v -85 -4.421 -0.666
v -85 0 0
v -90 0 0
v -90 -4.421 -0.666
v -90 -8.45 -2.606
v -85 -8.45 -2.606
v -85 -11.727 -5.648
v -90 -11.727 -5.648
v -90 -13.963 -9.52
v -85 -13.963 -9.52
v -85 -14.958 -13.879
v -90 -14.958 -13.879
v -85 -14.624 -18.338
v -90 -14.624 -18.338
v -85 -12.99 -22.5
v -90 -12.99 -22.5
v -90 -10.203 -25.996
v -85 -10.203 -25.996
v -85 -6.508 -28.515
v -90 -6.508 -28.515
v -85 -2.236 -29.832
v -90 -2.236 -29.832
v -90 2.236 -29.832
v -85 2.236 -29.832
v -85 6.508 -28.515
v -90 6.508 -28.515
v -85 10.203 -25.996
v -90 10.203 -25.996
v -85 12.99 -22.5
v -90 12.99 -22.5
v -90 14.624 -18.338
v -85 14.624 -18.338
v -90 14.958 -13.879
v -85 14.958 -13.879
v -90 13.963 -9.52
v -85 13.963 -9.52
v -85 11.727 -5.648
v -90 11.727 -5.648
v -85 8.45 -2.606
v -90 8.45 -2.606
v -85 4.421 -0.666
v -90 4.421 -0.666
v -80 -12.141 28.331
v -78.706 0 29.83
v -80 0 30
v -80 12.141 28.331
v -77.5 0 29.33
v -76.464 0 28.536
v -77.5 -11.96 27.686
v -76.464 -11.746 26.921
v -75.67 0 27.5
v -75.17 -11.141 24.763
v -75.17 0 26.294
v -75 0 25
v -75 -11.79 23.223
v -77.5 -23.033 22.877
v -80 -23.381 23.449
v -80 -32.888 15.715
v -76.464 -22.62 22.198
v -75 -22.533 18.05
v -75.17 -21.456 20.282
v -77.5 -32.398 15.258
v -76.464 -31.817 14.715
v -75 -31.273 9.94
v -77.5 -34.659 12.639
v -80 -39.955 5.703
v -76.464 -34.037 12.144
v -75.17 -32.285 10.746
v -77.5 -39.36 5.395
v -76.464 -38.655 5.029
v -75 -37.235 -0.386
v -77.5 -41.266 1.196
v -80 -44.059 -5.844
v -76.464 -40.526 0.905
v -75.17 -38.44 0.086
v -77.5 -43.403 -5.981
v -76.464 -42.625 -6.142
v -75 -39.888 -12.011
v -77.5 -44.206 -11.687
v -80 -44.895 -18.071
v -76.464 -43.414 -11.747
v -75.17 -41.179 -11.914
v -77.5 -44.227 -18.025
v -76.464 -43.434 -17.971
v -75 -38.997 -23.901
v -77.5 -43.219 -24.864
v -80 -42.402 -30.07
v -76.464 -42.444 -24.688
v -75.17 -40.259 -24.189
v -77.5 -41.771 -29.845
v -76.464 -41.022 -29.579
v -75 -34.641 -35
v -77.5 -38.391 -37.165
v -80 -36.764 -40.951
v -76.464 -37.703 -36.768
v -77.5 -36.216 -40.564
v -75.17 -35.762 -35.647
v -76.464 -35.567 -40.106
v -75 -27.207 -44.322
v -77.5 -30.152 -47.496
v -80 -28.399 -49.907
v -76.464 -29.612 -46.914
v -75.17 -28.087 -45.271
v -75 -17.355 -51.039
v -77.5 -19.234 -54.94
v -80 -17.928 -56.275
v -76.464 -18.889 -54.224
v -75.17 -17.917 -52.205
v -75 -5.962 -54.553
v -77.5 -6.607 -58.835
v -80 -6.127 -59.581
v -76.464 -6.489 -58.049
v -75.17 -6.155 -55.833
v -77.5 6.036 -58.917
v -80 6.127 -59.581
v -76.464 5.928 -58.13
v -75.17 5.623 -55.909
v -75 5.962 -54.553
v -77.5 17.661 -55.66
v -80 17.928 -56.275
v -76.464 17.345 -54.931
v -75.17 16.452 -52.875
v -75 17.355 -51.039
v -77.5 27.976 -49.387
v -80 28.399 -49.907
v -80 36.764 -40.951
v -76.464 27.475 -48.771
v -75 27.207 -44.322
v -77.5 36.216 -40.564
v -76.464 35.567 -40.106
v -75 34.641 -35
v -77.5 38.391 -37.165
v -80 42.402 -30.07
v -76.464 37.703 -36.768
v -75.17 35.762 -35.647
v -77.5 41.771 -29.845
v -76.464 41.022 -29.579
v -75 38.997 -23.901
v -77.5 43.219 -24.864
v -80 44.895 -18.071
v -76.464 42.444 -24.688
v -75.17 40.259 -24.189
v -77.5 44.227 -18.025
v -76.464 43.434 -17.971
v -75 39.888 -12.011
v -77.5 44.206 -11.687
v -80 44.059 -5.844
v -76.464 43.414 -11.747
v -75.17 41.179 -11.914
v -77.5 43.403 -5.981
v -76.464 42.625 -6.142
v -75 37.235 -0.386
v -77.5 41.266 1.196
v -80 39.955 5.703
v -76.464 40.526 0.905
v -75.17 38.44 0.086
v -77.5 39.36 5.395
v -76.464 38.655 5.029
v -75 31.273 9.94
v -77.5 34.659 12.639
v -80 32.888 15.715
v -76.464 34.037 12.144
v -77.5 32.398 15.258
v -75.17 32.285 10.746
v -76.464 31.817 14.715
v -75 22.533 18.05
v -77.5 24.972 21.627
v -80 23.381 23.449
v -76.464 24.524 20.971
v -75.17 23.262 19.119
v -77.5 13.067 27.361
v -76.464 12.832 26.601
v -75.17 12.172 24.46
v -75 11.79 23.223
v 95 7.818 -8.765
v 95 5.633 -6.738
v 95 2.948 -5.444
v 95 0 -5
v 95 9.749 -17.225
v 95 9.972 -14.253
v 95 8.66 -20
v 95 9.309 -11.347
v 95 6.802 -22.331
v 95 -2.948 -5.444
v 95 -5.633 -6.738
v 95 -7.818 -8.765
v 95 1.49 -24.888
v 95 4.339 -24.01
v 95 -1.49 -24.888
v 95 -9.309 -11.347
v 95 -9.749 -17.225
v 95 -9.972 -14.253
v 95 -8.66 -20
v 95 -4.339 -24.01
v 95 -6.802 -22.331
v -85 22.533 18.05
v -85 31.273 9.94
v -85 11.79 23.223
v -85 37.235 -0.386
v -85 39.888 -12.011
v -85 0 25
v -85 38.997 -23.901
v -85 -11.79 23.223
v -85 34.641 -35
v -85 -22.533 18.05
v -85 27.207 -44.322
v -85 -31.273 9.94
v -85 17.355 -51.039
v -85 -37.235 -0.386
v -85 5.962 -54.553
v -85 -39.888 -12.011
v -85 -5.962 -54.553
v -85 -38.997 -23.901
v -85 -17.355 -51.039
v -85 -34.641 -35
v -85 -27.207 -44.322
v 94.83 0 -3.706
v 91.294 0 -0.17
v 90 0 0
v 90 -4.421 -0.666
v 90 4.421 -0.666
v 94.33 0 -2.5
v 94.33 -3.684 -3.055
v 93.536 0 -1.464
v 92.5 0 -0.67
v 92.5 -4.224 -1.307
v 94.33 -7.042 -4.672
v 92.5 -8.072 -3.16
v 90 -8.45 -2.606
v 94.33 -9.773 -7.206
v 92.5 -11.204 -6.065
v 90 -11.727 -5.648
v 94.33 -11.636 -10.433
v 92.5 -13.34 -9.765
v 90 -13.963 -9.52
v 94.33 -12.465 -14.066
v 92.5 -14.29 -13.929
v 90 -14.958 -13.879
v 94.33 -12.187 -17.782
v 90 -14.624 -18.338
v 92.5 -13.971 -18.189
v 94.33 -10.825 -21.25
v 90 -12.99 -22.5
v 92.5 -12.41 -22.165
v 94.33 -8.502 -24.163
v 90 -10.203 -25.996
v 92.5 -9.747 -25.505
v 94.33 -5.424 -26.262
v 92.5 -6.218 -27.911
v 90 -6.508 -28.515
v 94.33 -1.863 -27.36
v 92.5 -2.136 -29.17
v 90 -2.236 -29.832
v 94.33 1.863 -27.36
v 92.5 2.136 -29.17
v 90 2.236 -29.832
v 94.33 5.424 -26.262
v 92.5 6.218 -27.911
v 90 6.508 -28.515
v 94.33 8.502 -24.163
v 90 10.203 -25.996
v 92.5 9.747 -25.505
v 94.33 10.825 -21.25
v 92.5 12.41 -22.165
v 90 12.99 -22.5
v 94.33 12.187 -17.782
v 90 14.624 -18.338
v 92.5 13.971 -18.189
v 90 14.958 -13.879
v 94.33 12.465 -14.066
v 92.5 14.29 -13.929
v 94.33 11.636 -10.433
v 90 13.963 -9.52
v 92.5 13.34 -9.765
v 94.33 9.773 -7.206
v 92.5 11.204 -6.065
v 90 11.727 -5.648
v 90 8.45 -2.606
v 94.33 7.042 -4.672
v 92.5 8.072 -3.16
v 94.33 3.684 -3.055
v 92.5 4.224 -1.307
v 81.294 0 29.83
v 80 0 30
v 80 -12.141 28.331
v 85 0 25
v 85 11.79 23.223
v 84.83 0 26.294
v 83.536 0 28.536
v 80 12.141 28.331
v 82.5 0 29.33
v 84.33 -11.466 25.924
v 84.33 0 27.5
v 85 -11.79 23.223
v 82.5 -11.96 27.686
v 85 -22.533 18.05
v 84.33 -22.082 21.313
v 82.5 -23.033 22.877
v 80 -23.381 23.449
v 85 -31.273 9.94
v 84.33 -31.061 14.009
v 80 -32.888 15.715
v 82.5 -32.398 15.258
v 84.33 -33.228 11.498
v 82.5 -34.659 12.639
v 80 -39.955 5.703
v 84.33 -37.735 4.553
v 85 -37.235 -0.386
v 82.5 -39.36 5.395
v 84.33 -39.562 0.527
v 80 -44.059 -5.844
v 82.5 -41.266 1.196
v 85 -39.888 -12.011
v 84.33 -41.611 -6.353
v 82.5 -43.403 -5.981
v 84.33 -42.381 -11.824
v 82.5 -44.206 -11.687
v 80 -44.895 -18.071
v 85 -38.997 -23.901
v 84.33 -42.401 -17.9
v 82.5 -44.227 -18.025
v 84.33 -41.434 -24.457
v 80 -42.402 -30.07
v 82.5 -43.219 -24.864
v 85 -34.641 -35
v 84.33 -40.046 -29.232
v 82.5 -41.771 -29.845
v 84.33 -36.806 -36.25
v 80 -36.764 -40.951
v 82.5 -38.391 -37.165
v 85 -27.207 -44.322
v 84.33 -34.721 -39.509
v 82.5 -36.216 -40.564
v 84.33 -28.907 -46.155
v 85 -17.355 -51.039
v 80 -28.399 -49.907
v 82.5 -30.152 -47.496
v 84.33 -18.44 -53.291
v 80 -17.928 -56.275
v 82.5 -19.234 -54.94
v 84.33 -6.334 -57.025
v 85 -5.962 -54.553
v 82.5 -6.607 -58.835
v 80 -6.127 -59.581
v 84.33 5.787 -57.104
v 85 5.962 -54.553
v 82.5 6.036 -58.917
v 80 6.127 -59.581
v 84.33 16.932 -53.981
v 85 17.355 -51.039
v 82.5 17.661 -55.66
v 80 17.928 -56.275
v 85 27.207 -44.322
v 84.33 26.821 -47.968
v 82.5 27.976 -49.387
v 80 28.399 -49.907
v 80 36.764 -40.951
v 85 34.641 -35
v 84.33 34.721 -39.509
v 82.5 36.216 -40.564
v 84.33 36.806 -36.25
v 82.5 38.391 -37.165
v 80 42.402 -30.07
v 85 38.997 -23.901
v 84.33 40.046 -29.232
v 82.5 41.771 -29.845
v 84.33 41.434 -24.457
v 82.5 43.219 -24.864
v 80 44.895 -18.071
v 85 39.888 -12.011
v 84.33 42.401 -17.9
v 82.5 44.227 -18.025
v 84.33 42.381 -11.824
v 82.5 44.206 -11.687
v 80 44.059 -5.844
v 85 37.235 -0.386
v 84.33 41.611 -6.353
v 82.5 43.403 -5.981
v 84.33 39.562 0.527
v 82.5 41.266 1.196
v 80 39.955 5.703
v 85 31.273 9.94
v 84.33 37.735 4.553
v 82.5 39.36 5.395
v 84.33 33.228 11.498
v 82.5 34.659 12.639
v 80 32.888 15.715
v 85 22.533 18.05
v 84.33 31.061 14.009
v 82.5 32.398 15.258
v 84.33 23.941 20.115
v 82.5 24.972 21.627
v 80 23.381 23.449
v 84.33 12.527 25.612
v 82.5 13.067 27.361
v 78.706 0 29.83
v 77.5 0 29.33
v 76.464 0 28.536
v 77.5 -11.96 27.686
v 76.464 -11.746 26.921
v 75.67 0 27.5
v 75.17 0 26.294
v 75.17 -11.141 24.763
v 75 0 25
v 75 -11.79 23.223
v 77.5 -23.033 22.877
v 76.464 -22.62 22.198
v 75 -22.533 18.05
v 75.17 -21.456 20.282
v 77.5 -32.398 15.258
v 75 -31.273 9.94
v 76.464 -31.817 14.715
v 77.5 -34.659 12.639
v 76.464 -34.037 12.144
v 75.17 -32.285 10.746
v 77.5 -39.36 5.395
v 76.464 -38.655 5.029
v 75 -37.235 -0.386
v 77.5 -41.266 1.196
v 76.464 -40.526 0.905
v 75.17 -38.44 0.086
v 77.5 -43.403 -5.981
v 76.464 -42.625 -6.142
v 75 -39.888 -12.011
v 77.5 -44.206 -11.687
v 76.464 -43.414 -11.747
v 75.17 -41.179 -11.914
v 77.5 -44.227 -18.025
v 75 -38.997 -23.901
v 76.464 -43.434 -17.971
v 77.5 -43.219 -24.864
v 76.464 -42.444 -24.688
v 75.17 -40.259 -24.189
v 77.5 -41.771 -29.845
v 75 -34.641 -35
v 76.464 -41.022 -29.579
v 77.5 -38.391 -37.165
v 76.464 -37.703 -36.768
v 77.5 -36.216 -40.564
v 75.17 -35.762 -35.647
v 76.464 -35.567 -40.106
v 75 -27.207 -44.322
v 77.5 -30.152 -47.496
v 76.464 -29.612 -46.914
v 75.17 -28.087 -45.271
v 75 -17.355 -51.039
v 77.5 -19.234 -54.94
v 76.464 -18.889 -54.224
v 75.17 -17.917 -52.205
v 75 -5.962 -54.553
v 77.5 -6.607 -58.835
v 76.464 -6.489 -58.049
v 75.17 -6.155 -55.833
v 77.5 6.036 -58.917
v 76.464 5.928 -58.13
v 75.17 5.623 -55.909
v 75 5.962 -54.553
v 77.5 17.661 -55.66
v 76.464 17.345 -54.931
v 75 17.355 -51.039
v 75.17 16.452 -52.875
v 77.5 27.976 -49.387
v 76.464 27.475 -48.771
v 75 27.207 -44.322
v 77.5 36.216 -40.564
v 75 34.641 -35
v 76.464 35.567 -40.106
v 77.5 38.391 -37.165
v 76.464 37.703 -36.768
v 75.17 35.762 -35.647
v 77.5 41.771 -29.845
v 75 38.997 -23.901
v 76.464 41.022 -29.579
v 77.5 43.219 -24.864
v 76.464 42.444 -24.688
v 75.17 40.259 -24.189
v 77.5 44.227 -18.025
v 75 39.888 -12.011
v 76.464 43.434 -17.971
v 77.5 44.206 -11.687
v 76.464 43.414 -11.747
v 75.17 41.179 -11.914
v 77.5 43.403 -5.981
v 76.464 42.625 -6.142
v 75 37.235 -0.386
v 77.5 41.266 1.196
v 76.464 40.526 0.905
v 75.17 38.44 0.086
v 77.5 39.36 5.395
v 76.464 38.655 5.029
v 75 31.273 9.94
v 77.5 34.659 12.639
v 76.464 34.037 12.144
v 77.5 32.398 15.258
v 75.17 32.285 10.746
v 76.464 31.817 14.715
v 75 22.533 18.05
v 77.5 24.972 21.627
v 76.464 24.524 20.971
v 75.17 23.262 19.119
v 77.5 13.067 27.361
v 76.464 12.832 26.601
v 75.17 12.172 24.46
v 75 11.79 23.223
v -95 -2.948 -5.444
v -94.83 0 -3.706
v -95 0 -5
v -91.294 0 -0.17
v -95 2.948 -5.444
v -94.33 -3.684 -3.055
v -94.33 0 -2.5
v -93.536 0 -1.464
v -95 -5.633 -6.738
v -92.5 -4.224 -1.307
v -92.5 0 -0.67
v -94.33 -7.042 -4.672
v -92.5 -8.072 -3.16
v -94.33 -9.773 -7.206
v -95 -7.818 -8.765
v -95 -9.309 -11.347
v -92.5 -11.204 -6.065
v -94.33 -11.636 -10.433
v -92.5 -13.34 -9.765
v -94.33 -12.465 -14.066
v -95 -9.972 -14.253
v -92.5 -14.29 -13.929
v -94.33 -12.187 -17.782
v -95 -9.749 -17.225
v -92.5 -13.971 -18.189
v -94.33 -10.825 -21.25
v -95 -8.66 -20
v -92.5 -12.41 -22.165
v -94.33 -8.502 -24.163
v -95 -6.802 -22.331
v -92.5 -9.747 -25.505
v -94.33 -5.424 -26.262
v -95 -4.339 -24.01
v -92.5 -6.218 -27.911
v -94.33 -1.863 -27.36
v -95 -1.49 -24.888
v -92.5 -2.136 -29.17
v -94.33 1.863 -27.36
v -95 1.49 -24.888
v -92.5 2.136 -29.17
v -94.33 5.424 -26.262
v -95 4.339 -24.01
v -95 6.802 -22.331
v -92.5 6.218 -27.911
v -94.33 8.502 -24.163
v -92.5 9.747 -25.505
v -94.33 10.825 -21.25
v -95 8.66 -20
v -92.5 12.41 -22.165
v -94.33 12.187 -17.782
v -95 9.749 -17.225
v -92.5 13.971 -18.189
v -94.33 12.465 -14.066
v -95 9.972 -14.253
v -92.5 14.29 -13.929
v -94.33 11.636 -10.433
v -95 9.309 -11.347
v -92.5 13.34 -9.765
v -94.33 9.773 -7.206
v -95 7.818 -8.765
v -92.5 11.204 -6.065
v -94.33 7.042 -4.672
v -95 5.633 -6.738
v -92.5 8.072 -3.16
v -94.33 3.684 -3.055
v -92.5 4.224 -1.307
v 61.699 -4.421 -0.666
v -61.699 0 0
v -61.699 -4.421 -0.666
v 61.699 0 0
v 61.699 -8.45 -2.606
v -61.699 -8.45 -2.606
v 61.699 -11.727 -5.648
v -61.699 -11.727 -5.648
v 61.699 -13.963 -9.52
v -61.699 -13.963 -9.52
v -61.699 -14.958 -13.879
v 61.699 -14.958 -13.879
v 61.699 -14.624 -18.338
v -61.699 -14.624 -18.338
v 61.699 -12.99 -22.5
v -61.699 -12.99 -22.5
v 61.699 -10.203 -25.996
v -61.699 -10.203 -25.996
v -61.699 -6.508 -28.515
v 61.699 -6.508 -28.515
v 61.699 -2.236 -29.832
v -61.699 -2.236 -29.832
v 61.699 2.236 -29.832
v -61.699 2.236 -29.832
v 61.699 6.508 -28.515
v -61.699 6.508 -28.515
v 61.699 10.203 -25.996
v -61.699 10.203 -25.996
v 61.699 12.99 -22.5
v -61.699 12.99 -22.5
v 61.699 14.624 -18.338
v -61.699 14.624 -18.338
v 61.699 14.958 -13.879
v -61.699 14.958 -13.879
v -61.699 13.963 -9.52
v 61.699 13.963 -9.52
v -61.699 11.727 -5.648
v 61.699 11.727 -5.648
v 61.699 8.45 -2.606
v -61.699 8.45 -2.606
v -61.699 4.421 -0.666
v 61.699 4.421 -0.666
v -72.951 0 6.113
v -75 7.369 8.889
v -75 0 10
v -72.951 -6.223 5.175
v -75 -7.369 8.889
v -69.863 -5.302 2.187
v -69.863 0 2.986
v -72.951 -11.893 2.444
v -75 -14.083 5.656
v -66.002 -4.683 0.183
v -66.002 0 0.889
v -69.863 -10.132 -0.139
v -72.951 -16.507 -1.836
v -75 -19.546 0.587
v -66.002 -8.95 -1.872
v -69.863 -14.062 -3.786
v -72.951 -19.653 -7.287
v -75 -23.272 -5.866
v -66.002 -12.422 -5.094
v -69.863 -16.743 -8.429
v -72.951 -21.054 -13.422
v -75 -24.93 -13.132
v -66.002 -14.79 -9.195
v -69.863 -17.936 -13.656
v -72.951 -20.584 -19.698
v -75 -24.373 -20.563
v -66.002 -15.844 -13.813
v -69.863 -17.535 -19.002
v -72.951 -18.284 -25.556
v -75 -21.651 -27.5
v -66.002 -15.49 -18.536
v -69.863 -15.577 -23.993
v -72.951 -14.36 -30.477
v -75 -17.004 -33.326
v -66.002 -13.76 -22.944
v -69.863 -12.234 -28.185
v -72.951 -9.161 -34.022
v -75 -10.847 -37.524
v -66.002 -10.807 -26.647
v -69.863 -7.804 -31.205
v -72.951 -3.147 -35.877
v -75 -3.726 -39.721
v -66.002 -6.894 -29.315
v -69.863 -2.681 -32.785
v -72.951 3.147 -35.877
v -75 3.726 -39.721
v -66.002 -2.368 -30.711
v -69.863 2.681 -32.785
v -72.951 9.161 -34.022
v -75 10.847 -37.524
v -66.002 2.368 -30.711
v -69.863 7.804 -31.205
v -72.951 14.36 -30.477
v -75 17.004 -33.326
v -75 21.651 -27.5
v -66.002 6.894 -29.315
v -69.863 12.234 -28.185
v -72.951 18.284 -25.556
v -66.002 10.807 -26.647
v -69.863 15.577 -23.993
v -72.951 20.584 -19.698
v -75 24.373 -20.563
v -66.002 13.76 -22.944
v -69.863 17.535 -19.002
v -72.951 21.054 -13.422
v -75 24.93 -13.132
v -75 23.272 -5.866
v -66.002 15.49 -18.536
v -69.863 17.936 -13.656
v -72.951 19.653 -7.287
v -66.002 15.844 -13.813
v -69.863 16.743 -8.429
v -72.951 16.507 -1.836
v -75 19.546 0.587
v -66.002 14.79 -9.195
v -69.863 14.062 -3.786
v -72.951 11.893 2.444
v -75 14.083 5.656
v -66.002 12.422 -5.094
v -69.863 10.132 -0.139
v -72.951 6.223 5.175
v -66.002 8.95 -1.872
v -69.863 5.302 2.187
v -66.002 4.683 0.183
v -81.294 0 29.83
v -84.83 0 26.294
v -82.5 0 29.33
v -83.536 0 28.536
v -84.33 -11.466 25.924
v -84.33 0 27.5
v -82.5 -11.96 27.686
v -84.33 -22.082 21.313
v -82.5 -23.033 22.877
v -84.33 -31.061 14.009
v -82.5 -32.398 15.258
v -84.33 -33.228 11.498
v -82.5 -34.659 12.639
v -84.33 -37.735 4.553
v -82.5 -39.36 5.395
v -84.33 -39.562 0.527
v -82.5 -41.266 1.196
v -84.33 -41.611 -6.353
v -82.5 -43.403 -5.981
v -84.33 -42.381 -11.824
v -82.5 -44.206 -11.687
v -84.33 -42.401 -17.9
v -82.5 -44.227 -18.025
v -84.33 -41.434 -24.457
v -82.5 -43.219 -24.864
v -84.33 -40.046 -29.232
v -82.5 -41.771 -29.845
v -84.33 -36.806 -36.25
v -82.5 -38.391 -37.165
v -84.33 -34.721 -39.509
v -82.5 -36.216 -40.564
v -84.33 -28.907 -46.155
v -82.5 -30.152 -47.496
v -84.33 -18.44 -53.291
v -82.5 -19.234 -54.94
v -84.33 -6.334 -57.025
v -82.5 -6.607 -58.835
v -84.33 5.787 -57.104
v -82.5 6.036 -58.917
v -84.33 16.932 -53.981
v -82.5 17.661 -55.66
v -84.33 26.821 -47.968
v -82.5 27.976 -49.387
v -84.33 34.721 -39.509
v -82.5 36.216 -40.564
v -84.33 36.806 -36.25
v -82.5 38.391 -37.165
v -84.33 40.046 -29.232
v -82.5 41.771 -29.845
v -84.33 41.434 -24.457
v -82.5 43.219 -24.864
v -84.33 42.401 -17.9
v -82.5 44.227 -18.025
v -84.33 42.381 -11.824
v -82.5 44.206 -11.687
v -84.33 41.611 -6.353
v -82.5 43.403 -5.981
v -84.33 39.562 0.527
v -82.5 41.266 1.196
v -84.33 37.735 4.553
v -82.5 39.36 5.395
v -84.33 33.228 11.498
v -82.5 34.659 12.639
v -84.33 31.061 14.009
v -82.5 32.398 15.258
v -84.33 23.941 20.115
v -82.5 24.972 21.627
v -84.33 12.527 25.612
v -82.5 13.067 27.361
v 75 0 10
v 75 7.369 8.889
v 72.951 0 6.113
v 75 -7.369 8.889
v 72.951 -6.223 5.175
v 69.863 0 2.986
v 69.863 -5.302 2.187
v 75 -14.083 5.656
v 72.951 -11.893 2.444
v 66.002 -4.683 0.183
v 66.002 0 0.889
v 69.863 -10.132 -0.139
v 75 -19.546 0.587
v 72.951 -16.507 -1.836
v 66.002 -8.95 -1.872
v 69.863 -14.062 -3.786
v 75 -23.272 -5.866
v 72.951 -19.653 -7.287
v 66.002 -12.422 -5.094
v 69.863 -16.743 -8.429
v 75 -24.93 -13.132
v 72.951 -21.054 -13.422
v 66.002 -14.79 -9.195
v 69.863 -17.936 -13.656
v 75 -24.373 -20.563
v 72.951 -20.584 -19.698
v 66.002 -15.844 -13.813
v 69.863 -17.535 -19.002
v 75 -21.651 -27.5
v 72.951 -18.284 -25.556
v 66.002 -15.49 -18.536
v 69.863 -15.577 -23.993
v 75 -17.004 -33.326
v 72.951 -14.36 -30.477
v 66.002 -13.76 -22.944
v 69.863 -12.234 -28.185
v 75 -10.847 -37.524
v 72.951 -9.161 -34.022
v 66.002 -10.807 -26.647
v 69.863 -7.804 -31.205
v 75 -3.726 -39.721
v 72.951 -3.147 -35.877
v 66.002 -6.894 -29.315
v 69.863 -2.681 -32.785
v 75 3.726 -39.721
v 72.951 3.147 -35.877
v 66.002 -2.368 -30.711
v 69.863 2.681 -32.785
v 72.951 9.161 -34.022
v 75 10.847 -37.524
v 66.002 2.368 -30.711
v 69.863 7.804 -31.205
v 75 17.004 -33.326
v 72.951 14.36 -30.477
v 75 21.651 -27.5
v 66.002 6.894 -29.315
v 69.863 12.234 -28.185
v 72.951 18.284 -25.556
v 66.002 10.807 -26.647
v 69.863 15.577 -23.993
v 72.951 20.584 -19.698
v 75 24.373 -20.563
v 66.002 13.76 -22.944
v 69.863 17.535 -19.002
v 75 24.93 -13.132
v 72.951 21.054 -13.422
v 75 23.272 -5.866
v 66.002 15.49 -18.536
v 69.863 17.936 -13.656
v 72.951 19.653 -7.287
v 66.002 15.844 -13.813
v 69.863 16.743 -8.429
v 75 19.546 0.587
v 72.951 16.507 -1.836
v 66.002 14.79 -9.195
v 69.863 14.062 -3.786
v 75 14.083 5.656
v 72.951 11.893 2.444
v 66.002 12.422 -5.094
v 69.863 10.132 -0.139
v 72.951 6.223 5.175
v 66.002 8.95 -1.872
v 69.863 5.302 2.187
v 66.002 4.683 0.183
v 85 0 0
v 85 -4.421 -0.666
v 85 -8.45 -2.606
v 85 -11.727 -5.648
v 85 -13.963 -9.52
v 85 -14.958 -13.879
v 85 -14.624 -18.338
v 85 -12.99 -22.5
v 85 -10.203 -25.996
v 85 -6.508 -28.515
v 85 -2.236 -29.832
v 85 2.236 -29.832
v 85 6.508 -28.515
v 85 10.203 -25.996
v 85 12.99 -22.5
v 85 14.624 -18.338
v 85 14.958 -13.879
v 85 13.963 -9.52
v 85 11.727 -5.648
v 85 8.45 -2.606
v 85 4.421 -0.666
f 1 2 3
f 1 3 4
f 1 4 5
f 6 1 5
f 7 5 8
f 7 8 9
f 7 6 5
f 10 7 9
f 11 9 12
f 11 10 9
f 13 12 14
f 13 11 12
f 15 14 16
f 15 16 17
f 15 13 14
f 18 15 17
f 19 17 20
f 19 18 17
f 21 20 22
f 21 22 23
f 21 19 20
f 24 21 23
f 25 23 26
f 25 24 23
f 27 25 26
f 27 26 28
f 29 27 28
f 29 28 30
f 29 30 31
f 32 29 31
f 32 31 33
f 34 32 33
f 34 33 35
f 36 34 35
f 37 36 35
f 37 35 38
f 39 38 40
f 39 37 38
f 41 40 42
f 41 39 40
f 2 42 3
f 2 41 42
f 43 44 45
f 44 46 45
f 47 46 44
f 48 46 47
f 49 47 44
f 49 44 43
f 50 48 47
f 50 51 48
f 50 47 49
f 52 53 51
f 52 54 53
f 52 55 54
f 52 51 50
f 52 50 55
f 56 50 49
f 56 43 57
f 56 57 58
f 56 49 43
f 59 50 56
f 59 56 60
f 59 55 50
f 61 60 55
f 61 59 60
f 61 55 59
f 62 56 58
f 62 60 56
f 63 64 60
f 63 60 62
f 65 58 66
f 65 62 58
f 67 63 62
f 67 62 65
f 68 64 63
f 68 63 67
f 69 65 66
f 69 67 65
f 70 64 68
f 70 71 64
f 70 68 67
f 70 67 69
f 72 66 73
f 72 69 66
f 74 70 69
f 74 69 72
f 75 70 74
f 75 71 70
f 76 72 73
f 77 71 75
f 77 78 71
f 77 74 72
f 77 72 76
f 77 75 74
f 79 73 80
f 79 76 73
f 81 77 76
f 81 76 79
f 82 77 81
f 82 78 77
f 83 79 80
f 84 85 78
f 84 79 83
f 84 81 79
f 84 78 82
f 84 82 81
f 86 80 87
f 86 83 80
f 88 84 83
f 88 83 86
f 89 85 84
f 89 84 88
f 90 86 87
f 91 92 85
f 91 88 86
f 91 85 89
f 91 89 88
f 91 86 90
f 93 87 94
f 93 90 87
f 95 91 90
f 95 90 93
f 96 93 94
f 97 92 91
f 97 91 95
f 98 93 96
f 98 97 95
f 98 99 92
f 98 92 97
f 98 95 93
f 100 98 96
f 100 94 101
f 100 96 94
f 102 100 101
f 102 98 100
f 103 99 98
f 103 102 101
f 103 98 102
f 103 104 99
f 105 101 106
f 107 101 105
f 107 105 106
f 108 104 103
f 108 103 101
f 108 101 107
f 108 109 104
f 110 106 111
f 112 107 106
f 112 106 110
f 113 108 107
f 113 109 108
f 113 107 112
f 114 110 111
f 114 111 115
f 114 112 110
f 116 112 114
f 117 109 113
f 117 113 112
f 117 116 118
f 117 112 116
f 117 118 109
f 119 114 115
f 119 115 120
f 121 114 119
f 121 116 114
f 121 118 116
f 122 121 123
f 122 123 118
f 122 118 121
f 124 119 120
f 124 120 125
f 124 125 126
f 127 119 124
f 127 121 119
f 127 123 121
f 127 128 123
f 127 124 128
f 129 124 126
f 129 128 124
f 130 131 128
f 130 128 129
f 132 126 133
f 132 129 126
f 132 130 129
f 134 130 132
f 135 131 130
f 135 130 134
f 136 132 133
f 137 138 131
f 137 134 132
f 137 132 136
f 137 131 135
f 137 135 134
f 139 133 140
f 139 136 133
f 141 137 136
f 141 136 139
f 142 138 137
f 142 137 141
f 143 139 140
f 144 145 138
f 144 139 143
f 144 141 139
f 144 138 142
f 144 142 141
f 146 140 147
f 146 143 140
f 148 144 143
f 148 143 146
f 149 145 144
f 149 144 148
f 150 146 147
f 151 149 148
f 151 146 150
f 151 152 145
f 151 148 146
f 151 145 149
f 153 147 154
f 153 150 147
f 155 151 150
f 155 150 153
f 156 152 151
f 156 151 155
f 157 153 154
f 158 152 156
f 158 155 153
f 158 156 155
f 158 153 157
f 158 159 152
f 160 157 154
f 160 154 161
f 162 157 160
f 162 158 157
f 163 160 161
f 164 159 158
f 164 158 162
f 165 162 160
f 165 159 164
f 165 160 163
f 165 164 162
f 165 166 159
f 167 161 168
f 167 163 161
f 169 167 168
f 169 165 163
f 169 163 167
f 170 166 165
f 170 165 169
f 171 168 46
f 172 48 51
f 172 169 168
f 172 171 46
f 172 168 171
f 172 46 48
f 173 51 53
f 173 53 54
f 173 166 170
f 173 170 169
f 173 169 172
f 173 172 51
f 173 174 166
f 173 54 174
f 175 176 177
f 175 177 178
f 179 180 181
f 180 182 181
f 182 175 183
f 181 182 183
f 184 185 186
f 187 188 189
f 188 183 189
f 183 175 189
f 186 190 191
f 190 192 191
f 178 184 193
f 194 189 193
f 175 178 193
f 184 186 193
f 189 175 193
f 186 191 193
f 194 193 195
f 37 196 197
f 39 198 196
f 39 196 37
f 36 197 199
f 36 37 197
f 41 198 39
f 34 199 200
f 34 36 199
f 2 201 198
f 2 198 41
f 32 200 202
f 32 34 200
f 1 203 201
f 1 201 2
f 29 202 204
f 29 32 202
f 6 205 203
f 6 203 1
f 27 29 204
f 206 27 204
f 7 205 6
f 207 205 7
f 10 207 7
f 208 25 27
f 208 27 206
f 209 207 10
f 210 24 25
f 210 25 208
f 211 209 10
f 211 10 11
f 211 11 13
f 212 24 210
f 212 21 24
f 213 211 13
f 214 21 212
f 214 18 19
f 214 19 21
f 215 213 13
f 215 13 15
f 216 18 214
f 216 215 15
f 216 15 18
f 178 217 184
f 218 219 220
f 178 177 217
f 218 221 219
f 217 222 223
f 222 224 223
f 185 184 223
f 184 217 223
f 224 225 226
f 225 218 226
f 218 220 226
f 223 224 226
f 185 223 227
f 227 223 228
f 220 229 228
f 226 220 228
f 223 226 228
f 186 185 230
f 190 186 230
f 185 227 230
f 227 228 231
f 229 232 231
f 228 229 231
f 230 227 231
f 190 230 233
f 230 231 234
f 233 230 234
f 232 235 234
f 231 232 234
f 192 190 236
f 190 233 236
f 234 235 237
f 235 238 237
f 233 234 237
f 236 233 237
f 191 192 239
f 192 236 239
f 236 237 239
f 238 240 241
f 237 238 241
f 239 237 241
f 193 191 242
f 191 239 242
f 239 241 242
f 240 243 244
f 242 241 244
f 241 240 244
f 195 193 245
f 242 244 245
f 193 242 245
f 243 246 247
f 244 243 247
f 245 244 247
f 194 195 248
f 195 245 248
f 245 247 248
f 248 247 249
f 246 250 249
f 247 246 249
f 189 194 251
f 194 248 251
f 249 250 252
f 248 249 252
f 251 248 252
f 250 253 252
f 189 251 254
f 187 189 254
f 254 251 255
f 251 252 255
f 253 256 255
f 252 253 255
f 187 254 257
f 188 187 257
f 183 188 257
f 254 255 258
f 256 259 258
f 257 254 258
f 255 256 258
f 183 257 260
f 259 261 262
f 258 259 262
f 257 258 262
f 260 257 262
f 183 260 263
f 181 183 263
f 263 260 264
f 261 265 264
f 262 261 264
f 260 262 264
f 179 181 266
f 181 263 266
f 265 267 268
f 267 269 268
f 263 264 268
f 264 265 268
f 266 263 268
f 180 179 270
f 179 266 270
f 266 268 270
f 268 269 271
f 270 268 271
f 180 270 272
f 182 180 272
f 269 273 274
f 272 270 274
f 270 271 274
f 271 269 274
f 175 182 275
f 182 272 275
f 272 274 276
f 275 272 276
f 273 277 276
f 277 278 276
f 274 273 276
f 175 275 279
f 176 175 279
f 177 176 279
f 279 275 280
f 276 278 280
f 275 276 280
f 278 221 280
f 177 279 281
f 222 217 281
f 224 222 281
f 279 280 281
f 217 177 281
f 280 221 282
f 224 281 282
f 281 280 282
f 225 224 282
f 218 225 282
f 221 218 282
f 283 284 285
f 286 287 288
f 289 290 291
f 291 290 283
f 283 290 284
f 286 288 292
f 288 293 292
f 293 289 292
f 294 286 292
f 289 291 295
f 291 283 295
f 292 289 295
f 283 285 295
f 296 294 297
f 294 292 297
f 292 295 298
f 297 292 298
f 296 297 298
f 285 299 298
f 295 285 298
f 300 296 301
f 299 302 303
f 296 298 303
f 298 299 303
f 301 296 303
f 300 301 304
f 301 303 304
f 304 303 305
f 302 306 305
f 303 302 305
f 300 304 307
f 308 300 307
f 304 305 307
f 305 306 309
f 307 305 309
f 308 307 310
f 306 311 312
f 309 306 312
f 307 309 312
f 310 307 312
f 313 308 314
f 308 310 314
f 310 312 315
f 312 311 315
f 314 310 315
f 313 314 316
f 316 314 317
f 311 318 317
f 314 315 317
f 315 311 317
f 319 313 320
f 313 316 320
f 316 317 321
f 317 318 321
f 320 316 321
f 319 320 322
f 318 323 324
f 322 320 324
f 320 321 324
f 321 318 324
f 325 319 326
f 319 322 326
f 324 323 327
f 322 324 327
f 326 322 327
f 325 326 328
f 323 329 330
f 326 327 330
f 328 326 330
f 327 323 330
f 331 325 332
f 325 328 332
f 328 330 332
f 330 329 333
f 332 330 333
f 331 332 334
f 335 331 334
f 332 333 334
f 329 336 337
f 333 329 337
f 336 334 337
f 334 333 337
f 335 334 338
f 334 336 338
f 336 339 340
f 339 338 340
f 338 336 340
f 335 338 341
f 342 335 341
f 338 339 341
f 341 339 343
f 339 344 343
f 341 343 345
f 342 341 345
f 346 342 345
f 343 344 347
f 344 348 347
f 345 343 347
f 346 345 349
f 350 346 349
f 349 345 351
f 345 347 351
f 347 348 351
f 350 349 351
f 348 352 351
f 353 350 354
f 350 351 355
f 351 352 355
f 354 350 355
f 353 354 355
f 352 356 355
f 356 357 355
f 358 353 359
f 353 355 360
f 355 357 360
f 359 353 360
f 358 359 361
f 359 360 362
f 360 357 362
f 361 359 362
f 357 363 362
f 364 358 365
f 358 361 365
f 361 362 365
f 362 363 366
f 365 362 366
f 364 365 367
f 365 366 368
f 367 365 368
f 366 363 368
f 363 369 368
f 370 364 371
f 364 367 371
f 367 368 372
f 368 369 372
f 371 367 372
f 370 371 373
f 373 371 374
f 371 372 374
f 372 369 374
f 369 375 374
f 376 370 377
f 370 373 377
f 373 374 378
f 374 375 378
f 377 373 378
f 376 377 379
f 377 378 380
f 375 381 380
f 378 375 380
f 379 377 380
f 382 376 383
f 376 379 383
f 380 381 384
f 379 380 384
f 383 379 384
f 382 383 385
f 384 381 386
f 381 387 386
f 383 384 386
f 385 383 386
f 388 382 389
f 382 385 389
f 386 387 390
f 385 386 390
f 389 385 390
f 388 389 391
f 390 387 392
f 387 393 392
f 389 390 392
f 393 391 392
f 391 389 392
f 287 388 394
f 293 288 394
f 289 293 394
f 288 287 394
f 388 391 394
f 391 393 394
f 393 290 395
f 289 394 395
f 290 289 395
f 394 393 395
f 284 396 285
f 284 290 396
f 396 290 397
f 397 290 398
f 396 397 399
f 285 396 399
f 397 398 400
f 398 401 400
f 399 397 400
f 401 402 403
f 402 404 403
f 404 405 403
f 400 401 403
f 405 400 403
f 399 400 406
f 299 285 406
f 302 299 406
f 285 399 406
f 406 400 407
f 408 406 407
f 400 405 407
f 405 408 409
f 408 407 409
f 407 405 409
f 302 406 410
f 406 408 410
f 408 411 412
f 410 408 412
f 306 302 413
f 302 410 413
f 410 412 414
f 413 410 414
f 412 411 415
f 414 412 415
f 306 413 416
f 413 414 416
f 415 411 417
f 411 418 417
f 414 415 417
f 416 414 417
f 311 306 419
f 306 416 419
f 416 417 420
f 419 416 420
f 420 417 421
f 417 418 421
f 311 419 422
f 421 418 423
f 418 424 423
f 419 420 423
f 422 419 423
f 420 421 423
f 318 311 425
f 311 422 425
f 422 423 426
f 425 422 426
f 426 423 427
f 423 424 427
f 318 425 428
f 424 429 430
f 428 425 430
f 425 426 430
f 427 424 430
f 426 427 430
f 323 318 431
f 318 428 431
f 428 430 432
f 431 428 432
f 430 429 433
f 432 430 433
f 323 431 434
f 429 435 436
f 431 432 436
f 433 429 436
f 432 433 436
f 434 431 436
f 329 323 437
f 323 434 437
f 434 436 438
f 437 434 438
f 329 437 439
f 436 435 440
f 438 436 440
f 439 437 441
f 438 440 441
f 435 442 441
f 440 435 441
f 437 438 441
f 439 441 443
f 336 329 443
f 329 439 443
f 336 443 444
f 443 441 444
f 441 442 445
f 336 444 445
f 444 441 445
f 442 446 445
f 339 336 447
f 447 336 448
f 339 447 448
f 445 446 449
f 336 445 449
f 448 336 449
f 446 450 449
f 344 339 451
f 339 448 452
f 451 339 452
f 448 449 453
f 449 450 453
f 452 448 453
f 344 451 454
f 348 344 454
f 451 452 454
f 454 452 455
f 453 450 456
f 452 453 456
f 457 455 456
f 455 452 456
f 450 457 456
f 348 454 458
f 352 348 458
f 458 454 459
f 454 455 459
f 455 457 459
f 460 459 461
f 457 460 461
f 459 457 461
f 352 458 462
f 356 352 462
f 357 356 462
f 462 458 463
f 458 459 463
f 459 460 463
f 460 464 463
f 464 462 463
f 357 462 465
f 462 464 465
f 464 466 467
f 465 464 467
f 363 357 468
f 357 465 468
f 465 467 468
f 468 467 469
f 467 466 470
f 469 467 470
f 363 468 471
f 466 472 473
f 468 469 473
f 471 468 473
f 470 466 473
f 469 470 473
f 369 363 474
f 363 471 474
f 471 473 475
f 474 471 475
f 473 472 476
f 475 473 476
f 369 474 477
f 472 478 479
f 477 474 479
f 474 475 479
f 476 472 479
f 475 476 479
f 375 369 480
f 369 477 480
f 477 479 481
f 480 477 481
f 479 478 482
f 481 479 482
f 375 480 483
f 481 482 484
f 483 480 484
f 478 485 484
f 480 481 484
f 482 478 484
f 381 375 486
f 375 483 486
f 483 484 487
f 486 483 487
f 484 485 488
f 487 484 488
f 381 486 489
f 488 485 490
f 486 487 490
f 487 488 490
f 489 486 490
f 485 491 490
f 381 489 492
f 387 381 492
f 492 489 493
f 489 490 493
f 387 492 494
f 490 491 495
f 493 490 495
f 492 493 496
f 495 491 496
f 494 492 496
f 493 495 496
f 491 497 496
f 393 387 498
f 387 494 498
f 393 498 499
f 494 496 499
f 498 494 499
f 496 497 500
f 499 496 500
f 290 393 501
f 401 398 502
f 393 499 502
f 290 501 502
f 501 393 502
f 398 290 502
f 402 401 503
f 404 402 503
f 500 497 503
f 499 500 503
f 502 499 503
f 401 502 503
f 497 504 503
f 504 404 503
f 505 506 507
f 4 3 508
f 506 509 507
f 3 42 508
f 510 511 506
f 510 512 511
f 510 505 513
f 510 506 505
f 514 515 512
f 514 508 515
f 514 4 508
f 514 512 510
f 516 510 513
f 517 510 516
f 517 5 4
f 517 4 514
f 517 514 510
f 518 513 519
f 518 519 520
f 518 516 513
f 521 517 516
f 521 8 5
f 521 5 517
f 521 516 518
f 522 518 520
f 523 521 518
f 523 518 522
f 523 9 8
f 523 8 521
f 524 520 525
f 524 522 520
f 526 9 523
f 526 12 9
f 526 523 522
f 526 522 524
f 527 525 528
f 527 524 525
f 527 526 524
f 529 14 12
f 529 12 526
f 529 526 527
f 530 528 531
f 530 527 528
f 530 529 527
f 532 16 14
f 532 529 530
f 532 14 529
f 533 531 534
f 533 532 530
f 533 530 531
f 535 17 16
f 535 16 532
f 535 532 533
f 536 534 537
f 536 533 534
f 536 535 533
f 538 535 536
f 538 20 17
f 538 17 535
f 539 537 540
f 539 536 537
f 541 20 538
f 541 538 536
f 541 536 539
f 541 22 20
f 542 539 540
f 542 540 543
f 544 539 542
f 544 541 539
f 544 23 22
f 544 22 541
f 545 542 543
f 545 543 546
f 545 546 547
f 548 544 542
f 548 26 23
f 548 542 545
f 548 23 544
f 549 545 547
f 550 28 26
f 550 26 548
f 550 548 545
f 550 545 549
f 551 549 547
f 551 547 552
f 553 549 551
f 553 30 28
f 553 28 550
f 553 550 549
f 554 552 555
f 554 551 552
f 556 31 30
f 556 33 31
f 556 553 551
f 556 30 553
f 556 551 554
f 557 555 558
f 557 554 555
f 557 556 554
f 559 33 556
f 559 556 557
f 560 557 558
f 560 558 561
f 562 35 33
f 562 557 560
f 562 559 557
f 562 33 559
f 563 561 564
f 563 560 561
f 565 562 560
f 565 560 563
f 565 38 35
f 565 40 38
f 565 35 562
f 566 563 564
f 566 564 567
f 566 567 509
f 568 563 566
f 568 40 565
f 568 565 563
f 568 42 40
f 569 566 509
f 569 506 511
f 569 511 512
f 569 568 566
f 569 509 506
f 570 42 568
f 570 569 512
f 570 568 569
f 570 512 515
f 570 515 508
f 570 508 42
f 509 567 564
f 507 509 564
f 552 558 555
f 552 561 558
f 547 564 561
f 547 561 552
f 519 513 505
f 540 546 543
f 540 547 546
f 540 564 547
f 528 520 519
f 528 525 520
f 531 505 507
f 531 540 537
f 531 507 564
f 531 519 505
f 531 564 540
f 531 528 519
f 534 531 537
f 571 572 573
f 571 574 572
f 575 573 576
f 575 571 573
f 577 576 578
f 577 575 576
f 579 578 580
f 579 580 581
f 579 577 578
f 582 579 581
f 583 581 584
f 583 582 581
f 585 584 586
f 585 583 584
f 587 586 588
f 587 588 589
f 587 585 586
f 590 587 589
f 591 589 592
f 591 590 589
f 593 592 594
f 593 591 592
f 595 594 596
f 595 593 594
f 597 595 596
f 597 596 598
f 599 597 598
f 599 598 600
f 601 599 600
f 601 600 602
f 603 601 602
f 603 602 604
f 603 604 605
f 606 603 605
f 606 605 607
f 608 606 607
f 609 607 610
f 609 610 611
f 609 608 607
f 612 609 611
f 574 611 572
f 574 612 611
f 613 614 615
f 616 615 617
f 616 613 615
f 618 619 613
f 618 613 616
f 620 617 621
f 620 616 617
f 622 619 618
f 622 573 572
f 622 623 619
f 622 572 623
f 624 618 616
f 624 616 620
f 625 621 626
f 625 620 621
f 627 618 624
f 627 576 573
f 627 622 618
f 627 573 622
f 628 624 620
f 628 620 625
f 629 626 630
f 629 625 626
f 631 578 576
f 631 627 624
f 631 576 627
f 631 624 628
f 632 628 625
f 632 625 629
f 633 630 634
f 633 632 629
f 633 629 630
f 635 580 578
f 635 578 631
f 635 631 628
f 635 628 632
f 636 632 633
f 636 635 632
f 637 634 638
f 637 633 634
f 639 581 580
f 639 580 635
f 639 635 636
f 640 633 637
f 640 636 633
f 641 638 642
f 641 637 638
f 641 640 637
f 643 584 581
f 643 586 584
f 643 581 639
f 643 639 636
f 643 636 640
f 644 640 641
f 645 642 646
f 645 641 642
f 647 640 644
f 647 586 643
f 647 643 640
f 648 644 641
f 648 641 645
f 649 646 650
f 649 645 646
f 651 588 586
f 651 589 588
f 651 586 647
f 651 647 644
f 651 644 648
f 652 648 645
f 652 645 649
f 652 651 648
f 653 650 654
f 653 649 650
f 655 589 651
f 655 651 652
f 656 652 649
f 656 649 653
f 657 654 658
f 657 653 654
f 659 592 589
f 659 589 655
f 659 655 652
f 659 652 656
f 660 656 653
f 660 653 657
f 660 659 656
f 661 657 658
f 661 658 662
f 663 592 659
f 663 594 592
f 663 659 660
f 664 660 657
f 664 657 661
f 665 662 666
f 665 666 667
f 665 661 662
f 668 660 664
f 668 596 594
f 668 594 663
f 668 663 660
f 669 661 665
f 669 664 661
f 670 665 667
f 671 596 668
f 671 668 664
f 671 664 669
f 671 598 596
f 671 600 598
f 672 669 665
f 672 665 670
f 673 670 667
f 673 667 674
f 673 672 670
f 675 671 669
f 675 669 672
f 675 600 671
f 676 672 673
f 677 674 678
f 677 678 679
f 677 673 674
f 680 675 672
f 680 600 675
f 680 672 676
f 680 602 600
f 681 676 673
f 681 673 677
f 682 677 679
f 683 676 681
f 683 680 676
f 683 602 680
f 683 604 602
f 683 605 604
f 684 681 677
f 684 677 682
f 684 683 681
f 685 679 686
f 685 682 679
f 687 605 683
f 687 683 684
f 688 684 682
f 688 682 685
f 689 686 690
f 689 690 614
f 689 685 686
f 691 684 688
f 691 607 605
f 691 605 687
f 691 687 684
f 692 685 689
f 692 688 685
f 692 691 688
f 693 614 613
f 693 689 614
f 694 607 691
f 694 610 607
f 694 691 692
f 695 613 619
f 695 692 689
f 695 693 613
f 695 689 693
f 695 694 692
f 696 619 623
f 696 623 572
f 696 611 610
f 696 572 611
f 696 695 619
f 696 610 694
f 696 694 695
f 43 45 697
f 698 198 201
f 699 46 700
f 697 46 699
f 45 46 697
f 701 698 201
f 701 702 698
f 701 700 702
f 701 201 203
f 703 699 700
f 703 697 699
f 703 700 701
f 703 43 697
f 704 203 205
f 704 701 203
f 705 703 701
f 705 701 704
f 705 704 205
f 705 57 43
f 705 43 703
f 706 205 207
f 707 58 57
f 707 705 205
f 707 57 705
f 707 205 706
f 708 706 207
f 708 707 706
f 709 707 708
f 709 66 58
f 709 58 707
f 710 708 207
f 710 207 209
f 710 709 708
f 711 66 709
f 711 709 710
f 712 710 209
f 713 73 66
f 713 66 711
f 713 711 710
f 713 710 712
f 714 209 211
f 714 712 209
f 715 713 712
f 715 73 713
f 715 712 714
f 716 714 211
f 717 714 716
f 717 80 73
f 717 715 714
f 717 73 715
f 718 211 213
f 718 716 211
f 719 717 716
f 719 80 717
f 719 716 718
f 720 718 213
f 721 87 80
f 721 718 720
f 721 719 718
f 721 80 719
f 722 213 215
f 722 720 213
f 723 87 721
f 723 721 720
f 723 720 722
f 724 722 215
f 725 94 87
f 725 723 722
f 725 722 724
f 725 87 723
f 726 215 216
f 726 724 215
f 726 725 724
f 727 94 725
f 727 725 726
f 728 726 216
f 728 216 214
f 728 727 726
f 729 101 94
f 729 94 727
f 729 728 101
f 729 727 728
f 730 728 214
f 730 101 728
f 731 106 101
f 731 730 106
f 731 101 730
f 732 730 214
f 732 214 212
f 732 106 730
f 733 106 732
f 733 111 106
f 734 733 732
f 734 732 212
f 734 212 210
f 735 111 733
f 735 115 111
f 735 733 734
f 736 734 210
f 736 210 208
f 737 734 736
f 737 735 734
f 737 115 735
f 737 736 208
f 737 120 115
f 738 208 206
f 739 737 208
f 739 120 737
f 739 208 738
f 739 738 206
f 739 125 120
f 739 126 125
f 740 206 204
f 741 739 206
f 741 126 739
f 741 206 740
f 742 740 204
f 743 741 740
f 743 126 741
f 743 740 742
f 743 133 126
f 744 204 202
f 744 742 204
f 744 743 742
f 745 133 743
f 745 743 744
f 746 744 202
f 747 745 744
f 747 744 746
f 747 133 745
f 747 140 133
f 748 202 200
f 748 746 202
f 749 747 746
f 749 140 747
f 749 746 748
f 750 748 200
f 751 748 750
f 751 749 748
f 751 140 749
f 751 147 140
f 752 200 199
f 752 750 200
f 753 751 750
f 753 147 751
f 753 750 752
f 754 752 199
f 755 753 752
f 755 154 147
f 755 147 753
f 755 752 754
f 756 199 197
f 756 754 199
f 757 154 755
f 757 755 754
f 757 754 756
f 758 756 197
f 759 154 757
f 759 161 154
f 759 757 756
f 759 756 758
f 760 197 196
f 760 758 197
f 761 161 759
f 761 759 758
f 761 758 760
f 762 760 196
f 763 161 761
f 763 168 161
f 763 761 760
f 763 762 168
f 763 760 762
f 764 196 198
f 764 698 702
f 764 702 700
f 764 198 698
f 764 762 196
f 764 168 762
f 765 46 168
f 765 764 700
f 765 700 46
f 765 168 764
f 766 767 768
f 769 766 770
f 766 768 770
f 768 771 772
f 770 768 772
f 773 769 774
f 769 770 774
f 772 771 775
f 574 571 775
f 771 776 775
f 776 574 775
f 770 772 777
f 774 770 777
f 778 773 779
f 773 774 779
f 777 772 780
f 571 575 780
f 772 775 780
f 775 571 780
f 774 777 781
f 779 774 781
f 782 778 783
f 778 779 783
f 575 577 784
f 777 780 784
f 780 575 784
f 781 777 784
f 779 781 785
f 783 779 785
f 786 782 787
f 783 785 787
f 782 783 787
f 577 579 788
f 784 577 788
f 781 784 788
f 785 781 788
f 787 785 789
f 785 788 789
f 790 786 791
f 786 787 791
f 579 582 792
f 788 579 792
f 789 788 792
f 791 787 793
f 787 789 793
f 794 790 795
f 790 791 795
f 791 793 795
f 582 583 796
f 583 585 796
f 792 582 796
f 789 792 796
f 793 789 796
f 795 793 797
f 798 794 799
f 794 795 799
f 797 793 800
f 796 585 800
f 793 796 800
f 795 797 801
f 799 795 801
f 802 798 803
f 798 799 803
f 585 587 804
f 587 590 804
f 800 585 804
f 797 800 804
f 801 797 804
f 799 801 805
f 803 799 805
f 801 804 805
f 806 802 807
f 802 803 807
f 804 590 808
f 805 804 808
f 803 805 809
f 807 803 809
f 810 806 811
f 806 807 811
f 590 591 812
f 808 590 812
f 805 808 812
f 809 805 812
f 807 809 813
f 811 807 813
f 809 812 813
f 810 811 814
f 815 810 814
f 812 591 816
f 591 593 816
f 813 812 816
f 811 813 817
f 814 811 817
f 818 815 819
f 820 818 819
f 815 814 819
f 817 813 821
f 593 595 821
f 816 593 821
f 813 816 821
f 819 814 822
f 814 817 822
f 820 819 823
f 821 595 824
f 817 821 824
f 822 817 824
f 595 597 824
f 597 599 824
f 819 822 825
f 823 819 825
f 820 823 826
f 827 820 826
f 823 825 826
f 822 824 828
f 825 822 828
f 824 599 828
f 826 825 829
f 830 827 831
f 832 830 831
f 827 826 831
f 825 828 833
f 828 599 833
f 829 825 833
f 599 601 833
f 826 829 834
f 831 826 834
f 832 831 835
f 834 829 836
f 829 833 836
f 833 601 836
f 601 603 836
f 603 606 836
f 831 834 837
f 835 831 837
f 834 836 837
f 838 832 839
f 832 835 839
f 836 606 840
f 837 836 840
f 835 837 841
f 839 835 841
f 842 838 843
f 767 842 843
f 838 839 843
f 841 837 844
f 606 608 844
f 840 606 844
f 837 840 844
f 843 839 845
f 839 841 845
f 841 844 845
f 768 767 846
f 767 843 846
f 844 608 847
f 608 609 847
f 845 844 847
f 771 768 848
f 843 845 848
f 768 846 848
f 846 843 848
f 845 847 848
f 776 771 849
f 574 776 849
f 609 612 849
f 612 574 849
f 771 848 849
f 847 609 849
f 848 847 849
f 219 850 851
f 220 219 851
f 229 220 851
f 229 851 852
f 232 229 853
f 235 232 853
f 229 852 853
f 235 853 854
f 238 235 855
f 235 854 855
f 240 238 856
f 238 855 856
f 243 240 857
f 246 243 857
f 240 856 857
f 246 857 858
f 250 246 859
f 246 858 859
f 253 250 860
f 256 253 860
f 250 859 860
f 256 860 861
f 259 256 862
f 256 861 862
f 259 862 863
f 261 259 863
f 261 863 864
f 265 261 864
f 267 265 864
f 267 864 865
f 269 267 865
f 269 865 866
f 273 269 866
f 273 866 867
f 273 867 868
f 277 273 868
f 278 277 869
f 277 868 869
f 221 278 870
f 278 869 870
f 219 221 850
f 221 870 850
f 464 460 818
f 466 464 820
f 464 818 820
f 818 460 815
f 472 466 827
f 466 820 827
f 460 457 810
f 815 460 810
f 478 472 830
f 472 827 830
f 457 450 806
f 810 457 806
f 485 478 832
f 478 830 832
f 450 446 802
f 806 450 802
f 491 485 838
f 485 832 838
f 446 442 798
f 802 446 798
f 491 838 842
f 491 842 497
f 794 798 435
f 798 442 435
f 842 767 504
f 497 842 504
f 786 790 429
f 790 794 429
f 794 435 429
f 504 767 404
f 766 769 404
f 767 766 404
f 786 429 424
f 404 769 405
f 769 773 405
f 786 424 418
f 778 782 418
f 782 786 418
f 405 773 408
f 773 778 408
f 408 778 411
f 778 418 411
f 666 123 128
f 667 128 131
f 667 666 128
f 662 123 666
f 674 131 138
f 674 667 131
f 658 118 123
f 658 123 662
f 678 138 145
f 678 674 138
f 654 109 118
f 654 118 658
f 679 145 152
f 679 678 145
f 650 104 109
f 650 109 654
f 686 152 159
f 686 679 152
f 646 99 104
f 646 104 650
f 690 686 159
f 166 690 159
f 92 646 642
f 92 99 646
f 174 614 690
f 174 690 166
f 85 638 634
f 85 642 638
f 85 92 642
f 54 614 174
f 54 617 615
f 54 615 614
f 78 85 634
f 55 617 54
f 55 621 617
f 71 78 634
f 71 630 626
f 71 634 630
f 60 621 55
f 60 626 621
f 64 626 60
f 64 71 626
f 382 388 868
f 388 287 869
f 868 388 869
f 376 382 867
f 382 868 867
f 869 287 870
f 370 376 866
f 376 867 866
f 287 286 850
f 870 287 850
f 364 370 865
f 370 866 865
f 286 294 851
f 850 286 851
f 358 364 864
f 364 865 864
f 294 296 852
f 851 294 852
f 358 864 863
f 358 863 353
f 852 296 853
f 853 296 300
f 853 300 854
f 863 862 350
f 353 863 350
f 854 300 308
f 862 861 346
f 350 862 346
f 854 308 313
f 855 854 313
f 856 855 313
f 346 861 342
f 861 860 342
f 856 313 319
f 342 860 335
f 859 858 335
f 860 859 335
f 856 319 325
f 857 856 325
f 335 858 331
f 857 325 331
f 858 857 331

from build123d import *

# Parameters (mm, degrees)
F2_R = 4.99999


# Not quite as in the source:
# - a fillet or chamfer is up to 0.001 mm smaller than in the source, because OpenCascade refuses the exact size


with BuildPart() as f1:
    # F0 (on Front) → F1 (revolve)
    with BuildSketch(Plane.XZ):
        with BuildLine():
            Line((60, 0), (0, 0))
            Line((0, 0), (0, -15))
            Line((0, -15), (95, -15))
            Line((95, -15), (95, 0))
            Line((95, 0), (85, 0))
            Line((85, 0), (85, 30))
            Line((85, 30), (75, 30))
            Line((75, 30), (75, 10))
            Line((75, 10), (75, 0))
            Line((75, 0), (61.6987565648, 0))
            ThreePointArc((61.6987565648, 0), (60.8493782824, -0.0240674236), (60, 0))
        make_face()
        with BuildLine():
            Line((61.6987565648, 0), (60, 0))
            ThreePointArc((60, 0), (60.8493782824, -0.0240674236), (61.6987565648, 0))
        make_face()
        with BuildLine():
            ThreePointArc((75, 10), (69.863256471, 2.9863537681), (61.6987565648, 0))
            Line((61.6987565648, 0), (75, 0))
            Line((75, 0), (75, 10))
        make_face()
    revolve(axis=Axis((47.5, 0, -15), (1, 0, 0)))

    # F2 (radius 5 in the source; OpenCascade refuses exactly that, so slightly less here)
    f2_edges = [f1.edges().sort_by_distance(p)[0] for p in [
        (85, 0, -60),
        (75, 0, -60),
        (95, 0, -30),
    ]]
    fillet(f2_edges, radius=F2_R)

    # F3: F1 across face


with BuildPart() as f1_1:
    add(f1.part)
    add(f1.part.mirror(Plane(origin=(0, 0, -15), x_dir=(0, -1, 0), z_dir=(-1, 0, 0))))


solid = f1_1.part
